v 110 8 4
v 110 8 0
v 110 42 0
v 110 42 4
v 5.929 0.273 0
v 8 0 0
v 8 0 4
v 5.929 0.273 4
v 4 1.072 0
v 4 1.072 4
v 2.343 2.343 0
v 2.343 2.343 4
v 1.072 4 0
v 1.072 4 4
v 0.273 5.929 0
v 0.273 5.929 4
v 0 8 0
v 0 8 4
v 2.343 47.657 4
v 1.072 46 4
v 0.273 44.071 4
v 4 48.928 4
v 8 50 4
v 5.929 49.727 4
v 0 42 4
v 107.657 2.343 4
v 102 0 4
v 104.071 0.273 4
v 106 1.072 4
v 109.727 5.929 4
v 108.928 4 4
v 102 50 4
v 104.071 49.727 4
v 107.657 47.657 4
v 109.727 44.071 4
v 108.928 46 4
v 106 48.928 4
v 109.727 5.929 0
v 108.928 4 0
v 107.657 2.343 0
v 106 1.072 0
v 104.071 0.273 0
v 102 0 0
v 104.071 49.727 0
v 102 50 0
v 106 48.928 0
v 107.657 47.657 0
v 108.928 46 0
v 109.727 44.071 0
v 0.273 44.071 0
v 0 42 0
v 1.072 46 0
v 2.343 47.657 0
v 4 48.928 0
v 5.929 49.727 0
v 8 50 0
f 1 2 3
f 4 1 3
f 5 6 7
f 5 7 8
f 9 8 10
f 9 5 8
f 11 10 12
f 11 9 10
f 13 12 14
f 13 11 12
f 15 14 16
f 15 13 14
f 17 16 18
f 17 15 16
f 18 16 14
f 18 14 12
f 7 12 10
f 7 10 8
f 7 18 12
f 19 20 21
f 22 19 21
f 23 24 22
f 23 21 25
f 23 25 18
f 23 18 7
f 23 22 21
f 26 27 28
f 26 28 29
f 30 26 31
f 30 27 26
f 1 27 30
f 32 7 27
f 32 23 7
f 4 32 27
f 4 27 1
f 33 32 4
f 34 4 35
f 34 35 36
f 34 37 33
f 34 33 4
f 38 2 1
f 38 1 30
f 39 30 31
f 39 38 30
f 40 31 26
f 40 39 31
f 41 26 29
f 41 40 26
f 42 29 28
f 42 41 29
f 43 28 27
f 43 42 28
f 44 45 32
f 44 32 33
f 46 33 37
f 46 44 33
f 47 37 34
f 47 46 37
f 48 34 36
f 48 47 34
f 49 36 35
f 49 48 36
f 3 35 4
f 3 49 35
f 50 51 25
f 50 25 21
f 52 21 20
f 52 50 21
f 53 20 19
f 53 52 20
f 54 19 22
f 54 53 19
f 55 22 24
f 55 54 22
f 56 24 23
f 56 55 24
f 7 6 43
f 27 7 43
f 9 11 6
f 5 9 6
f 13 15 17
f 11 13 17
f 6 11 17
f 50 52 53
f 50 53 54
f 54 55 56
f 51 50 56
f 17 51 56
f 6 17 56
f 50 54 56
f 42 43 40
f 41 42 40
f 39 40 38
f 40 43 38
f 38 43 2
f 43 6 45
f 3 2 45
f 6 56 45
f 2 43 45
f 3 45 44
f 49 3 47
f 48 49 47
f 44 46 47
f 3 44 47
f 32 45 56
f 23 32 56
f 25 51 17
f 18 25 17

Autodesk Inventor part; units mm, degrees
ref_plane "YZ Plane" through (0, 0, 0) normal (1, 0, 0) x (0, 1, 0)
ref_plane "XZ Plane" through (0, 0, 0) normal (0, 1, 0) x (-1, 0, 0)
ref_plane "XY Plane" through (0, 0, 0) normal (0, 0, 1) x (1, 0, 0)
sketch "Sketch1" plane through (0, 0, 0) normal (0, 0, 1) x (1, 0, 0)
  line L0 (8, 0) -> (102, 0)
  line L1 (110, 8) -> (110, 42)
  line L2 (102, 50) -> (8, 50)
  line L3 (0, 42) -> (0, 8)
  arc A0 (2.5, 50) -> (0, 47.5) centre (2.5, 47.5) ccw
  arc A1 (110, 42) -> (102, 50) centre (102, 42) ccw
  arc A2 (8, 50) -> (0, 42) centre (8, 42) ccw
  arc A3 (0, 8) -> (8, 0) centre (8, 8) ccw
  arc A4 (102, 0) -> (110, 8) centre (102, 8) ccw
  circle A5 centre (55, 25) radius 6.6301 construction
  point P0 (0, 0)
  point P1 (110, 50)
  point P2 (110, 0)
  point P3 (0, 50)
  dimension "d0" = 110
  dimension "d1" = 50
  dimension "d3" = 8
  dimension "d4" = 8
  dimension "d6" = 8
extrude "Extrusion1" add sketch "Sketch1" along normal blind 4
properties part number "PistonFeederHeadMini" material "Stainless Steel"
